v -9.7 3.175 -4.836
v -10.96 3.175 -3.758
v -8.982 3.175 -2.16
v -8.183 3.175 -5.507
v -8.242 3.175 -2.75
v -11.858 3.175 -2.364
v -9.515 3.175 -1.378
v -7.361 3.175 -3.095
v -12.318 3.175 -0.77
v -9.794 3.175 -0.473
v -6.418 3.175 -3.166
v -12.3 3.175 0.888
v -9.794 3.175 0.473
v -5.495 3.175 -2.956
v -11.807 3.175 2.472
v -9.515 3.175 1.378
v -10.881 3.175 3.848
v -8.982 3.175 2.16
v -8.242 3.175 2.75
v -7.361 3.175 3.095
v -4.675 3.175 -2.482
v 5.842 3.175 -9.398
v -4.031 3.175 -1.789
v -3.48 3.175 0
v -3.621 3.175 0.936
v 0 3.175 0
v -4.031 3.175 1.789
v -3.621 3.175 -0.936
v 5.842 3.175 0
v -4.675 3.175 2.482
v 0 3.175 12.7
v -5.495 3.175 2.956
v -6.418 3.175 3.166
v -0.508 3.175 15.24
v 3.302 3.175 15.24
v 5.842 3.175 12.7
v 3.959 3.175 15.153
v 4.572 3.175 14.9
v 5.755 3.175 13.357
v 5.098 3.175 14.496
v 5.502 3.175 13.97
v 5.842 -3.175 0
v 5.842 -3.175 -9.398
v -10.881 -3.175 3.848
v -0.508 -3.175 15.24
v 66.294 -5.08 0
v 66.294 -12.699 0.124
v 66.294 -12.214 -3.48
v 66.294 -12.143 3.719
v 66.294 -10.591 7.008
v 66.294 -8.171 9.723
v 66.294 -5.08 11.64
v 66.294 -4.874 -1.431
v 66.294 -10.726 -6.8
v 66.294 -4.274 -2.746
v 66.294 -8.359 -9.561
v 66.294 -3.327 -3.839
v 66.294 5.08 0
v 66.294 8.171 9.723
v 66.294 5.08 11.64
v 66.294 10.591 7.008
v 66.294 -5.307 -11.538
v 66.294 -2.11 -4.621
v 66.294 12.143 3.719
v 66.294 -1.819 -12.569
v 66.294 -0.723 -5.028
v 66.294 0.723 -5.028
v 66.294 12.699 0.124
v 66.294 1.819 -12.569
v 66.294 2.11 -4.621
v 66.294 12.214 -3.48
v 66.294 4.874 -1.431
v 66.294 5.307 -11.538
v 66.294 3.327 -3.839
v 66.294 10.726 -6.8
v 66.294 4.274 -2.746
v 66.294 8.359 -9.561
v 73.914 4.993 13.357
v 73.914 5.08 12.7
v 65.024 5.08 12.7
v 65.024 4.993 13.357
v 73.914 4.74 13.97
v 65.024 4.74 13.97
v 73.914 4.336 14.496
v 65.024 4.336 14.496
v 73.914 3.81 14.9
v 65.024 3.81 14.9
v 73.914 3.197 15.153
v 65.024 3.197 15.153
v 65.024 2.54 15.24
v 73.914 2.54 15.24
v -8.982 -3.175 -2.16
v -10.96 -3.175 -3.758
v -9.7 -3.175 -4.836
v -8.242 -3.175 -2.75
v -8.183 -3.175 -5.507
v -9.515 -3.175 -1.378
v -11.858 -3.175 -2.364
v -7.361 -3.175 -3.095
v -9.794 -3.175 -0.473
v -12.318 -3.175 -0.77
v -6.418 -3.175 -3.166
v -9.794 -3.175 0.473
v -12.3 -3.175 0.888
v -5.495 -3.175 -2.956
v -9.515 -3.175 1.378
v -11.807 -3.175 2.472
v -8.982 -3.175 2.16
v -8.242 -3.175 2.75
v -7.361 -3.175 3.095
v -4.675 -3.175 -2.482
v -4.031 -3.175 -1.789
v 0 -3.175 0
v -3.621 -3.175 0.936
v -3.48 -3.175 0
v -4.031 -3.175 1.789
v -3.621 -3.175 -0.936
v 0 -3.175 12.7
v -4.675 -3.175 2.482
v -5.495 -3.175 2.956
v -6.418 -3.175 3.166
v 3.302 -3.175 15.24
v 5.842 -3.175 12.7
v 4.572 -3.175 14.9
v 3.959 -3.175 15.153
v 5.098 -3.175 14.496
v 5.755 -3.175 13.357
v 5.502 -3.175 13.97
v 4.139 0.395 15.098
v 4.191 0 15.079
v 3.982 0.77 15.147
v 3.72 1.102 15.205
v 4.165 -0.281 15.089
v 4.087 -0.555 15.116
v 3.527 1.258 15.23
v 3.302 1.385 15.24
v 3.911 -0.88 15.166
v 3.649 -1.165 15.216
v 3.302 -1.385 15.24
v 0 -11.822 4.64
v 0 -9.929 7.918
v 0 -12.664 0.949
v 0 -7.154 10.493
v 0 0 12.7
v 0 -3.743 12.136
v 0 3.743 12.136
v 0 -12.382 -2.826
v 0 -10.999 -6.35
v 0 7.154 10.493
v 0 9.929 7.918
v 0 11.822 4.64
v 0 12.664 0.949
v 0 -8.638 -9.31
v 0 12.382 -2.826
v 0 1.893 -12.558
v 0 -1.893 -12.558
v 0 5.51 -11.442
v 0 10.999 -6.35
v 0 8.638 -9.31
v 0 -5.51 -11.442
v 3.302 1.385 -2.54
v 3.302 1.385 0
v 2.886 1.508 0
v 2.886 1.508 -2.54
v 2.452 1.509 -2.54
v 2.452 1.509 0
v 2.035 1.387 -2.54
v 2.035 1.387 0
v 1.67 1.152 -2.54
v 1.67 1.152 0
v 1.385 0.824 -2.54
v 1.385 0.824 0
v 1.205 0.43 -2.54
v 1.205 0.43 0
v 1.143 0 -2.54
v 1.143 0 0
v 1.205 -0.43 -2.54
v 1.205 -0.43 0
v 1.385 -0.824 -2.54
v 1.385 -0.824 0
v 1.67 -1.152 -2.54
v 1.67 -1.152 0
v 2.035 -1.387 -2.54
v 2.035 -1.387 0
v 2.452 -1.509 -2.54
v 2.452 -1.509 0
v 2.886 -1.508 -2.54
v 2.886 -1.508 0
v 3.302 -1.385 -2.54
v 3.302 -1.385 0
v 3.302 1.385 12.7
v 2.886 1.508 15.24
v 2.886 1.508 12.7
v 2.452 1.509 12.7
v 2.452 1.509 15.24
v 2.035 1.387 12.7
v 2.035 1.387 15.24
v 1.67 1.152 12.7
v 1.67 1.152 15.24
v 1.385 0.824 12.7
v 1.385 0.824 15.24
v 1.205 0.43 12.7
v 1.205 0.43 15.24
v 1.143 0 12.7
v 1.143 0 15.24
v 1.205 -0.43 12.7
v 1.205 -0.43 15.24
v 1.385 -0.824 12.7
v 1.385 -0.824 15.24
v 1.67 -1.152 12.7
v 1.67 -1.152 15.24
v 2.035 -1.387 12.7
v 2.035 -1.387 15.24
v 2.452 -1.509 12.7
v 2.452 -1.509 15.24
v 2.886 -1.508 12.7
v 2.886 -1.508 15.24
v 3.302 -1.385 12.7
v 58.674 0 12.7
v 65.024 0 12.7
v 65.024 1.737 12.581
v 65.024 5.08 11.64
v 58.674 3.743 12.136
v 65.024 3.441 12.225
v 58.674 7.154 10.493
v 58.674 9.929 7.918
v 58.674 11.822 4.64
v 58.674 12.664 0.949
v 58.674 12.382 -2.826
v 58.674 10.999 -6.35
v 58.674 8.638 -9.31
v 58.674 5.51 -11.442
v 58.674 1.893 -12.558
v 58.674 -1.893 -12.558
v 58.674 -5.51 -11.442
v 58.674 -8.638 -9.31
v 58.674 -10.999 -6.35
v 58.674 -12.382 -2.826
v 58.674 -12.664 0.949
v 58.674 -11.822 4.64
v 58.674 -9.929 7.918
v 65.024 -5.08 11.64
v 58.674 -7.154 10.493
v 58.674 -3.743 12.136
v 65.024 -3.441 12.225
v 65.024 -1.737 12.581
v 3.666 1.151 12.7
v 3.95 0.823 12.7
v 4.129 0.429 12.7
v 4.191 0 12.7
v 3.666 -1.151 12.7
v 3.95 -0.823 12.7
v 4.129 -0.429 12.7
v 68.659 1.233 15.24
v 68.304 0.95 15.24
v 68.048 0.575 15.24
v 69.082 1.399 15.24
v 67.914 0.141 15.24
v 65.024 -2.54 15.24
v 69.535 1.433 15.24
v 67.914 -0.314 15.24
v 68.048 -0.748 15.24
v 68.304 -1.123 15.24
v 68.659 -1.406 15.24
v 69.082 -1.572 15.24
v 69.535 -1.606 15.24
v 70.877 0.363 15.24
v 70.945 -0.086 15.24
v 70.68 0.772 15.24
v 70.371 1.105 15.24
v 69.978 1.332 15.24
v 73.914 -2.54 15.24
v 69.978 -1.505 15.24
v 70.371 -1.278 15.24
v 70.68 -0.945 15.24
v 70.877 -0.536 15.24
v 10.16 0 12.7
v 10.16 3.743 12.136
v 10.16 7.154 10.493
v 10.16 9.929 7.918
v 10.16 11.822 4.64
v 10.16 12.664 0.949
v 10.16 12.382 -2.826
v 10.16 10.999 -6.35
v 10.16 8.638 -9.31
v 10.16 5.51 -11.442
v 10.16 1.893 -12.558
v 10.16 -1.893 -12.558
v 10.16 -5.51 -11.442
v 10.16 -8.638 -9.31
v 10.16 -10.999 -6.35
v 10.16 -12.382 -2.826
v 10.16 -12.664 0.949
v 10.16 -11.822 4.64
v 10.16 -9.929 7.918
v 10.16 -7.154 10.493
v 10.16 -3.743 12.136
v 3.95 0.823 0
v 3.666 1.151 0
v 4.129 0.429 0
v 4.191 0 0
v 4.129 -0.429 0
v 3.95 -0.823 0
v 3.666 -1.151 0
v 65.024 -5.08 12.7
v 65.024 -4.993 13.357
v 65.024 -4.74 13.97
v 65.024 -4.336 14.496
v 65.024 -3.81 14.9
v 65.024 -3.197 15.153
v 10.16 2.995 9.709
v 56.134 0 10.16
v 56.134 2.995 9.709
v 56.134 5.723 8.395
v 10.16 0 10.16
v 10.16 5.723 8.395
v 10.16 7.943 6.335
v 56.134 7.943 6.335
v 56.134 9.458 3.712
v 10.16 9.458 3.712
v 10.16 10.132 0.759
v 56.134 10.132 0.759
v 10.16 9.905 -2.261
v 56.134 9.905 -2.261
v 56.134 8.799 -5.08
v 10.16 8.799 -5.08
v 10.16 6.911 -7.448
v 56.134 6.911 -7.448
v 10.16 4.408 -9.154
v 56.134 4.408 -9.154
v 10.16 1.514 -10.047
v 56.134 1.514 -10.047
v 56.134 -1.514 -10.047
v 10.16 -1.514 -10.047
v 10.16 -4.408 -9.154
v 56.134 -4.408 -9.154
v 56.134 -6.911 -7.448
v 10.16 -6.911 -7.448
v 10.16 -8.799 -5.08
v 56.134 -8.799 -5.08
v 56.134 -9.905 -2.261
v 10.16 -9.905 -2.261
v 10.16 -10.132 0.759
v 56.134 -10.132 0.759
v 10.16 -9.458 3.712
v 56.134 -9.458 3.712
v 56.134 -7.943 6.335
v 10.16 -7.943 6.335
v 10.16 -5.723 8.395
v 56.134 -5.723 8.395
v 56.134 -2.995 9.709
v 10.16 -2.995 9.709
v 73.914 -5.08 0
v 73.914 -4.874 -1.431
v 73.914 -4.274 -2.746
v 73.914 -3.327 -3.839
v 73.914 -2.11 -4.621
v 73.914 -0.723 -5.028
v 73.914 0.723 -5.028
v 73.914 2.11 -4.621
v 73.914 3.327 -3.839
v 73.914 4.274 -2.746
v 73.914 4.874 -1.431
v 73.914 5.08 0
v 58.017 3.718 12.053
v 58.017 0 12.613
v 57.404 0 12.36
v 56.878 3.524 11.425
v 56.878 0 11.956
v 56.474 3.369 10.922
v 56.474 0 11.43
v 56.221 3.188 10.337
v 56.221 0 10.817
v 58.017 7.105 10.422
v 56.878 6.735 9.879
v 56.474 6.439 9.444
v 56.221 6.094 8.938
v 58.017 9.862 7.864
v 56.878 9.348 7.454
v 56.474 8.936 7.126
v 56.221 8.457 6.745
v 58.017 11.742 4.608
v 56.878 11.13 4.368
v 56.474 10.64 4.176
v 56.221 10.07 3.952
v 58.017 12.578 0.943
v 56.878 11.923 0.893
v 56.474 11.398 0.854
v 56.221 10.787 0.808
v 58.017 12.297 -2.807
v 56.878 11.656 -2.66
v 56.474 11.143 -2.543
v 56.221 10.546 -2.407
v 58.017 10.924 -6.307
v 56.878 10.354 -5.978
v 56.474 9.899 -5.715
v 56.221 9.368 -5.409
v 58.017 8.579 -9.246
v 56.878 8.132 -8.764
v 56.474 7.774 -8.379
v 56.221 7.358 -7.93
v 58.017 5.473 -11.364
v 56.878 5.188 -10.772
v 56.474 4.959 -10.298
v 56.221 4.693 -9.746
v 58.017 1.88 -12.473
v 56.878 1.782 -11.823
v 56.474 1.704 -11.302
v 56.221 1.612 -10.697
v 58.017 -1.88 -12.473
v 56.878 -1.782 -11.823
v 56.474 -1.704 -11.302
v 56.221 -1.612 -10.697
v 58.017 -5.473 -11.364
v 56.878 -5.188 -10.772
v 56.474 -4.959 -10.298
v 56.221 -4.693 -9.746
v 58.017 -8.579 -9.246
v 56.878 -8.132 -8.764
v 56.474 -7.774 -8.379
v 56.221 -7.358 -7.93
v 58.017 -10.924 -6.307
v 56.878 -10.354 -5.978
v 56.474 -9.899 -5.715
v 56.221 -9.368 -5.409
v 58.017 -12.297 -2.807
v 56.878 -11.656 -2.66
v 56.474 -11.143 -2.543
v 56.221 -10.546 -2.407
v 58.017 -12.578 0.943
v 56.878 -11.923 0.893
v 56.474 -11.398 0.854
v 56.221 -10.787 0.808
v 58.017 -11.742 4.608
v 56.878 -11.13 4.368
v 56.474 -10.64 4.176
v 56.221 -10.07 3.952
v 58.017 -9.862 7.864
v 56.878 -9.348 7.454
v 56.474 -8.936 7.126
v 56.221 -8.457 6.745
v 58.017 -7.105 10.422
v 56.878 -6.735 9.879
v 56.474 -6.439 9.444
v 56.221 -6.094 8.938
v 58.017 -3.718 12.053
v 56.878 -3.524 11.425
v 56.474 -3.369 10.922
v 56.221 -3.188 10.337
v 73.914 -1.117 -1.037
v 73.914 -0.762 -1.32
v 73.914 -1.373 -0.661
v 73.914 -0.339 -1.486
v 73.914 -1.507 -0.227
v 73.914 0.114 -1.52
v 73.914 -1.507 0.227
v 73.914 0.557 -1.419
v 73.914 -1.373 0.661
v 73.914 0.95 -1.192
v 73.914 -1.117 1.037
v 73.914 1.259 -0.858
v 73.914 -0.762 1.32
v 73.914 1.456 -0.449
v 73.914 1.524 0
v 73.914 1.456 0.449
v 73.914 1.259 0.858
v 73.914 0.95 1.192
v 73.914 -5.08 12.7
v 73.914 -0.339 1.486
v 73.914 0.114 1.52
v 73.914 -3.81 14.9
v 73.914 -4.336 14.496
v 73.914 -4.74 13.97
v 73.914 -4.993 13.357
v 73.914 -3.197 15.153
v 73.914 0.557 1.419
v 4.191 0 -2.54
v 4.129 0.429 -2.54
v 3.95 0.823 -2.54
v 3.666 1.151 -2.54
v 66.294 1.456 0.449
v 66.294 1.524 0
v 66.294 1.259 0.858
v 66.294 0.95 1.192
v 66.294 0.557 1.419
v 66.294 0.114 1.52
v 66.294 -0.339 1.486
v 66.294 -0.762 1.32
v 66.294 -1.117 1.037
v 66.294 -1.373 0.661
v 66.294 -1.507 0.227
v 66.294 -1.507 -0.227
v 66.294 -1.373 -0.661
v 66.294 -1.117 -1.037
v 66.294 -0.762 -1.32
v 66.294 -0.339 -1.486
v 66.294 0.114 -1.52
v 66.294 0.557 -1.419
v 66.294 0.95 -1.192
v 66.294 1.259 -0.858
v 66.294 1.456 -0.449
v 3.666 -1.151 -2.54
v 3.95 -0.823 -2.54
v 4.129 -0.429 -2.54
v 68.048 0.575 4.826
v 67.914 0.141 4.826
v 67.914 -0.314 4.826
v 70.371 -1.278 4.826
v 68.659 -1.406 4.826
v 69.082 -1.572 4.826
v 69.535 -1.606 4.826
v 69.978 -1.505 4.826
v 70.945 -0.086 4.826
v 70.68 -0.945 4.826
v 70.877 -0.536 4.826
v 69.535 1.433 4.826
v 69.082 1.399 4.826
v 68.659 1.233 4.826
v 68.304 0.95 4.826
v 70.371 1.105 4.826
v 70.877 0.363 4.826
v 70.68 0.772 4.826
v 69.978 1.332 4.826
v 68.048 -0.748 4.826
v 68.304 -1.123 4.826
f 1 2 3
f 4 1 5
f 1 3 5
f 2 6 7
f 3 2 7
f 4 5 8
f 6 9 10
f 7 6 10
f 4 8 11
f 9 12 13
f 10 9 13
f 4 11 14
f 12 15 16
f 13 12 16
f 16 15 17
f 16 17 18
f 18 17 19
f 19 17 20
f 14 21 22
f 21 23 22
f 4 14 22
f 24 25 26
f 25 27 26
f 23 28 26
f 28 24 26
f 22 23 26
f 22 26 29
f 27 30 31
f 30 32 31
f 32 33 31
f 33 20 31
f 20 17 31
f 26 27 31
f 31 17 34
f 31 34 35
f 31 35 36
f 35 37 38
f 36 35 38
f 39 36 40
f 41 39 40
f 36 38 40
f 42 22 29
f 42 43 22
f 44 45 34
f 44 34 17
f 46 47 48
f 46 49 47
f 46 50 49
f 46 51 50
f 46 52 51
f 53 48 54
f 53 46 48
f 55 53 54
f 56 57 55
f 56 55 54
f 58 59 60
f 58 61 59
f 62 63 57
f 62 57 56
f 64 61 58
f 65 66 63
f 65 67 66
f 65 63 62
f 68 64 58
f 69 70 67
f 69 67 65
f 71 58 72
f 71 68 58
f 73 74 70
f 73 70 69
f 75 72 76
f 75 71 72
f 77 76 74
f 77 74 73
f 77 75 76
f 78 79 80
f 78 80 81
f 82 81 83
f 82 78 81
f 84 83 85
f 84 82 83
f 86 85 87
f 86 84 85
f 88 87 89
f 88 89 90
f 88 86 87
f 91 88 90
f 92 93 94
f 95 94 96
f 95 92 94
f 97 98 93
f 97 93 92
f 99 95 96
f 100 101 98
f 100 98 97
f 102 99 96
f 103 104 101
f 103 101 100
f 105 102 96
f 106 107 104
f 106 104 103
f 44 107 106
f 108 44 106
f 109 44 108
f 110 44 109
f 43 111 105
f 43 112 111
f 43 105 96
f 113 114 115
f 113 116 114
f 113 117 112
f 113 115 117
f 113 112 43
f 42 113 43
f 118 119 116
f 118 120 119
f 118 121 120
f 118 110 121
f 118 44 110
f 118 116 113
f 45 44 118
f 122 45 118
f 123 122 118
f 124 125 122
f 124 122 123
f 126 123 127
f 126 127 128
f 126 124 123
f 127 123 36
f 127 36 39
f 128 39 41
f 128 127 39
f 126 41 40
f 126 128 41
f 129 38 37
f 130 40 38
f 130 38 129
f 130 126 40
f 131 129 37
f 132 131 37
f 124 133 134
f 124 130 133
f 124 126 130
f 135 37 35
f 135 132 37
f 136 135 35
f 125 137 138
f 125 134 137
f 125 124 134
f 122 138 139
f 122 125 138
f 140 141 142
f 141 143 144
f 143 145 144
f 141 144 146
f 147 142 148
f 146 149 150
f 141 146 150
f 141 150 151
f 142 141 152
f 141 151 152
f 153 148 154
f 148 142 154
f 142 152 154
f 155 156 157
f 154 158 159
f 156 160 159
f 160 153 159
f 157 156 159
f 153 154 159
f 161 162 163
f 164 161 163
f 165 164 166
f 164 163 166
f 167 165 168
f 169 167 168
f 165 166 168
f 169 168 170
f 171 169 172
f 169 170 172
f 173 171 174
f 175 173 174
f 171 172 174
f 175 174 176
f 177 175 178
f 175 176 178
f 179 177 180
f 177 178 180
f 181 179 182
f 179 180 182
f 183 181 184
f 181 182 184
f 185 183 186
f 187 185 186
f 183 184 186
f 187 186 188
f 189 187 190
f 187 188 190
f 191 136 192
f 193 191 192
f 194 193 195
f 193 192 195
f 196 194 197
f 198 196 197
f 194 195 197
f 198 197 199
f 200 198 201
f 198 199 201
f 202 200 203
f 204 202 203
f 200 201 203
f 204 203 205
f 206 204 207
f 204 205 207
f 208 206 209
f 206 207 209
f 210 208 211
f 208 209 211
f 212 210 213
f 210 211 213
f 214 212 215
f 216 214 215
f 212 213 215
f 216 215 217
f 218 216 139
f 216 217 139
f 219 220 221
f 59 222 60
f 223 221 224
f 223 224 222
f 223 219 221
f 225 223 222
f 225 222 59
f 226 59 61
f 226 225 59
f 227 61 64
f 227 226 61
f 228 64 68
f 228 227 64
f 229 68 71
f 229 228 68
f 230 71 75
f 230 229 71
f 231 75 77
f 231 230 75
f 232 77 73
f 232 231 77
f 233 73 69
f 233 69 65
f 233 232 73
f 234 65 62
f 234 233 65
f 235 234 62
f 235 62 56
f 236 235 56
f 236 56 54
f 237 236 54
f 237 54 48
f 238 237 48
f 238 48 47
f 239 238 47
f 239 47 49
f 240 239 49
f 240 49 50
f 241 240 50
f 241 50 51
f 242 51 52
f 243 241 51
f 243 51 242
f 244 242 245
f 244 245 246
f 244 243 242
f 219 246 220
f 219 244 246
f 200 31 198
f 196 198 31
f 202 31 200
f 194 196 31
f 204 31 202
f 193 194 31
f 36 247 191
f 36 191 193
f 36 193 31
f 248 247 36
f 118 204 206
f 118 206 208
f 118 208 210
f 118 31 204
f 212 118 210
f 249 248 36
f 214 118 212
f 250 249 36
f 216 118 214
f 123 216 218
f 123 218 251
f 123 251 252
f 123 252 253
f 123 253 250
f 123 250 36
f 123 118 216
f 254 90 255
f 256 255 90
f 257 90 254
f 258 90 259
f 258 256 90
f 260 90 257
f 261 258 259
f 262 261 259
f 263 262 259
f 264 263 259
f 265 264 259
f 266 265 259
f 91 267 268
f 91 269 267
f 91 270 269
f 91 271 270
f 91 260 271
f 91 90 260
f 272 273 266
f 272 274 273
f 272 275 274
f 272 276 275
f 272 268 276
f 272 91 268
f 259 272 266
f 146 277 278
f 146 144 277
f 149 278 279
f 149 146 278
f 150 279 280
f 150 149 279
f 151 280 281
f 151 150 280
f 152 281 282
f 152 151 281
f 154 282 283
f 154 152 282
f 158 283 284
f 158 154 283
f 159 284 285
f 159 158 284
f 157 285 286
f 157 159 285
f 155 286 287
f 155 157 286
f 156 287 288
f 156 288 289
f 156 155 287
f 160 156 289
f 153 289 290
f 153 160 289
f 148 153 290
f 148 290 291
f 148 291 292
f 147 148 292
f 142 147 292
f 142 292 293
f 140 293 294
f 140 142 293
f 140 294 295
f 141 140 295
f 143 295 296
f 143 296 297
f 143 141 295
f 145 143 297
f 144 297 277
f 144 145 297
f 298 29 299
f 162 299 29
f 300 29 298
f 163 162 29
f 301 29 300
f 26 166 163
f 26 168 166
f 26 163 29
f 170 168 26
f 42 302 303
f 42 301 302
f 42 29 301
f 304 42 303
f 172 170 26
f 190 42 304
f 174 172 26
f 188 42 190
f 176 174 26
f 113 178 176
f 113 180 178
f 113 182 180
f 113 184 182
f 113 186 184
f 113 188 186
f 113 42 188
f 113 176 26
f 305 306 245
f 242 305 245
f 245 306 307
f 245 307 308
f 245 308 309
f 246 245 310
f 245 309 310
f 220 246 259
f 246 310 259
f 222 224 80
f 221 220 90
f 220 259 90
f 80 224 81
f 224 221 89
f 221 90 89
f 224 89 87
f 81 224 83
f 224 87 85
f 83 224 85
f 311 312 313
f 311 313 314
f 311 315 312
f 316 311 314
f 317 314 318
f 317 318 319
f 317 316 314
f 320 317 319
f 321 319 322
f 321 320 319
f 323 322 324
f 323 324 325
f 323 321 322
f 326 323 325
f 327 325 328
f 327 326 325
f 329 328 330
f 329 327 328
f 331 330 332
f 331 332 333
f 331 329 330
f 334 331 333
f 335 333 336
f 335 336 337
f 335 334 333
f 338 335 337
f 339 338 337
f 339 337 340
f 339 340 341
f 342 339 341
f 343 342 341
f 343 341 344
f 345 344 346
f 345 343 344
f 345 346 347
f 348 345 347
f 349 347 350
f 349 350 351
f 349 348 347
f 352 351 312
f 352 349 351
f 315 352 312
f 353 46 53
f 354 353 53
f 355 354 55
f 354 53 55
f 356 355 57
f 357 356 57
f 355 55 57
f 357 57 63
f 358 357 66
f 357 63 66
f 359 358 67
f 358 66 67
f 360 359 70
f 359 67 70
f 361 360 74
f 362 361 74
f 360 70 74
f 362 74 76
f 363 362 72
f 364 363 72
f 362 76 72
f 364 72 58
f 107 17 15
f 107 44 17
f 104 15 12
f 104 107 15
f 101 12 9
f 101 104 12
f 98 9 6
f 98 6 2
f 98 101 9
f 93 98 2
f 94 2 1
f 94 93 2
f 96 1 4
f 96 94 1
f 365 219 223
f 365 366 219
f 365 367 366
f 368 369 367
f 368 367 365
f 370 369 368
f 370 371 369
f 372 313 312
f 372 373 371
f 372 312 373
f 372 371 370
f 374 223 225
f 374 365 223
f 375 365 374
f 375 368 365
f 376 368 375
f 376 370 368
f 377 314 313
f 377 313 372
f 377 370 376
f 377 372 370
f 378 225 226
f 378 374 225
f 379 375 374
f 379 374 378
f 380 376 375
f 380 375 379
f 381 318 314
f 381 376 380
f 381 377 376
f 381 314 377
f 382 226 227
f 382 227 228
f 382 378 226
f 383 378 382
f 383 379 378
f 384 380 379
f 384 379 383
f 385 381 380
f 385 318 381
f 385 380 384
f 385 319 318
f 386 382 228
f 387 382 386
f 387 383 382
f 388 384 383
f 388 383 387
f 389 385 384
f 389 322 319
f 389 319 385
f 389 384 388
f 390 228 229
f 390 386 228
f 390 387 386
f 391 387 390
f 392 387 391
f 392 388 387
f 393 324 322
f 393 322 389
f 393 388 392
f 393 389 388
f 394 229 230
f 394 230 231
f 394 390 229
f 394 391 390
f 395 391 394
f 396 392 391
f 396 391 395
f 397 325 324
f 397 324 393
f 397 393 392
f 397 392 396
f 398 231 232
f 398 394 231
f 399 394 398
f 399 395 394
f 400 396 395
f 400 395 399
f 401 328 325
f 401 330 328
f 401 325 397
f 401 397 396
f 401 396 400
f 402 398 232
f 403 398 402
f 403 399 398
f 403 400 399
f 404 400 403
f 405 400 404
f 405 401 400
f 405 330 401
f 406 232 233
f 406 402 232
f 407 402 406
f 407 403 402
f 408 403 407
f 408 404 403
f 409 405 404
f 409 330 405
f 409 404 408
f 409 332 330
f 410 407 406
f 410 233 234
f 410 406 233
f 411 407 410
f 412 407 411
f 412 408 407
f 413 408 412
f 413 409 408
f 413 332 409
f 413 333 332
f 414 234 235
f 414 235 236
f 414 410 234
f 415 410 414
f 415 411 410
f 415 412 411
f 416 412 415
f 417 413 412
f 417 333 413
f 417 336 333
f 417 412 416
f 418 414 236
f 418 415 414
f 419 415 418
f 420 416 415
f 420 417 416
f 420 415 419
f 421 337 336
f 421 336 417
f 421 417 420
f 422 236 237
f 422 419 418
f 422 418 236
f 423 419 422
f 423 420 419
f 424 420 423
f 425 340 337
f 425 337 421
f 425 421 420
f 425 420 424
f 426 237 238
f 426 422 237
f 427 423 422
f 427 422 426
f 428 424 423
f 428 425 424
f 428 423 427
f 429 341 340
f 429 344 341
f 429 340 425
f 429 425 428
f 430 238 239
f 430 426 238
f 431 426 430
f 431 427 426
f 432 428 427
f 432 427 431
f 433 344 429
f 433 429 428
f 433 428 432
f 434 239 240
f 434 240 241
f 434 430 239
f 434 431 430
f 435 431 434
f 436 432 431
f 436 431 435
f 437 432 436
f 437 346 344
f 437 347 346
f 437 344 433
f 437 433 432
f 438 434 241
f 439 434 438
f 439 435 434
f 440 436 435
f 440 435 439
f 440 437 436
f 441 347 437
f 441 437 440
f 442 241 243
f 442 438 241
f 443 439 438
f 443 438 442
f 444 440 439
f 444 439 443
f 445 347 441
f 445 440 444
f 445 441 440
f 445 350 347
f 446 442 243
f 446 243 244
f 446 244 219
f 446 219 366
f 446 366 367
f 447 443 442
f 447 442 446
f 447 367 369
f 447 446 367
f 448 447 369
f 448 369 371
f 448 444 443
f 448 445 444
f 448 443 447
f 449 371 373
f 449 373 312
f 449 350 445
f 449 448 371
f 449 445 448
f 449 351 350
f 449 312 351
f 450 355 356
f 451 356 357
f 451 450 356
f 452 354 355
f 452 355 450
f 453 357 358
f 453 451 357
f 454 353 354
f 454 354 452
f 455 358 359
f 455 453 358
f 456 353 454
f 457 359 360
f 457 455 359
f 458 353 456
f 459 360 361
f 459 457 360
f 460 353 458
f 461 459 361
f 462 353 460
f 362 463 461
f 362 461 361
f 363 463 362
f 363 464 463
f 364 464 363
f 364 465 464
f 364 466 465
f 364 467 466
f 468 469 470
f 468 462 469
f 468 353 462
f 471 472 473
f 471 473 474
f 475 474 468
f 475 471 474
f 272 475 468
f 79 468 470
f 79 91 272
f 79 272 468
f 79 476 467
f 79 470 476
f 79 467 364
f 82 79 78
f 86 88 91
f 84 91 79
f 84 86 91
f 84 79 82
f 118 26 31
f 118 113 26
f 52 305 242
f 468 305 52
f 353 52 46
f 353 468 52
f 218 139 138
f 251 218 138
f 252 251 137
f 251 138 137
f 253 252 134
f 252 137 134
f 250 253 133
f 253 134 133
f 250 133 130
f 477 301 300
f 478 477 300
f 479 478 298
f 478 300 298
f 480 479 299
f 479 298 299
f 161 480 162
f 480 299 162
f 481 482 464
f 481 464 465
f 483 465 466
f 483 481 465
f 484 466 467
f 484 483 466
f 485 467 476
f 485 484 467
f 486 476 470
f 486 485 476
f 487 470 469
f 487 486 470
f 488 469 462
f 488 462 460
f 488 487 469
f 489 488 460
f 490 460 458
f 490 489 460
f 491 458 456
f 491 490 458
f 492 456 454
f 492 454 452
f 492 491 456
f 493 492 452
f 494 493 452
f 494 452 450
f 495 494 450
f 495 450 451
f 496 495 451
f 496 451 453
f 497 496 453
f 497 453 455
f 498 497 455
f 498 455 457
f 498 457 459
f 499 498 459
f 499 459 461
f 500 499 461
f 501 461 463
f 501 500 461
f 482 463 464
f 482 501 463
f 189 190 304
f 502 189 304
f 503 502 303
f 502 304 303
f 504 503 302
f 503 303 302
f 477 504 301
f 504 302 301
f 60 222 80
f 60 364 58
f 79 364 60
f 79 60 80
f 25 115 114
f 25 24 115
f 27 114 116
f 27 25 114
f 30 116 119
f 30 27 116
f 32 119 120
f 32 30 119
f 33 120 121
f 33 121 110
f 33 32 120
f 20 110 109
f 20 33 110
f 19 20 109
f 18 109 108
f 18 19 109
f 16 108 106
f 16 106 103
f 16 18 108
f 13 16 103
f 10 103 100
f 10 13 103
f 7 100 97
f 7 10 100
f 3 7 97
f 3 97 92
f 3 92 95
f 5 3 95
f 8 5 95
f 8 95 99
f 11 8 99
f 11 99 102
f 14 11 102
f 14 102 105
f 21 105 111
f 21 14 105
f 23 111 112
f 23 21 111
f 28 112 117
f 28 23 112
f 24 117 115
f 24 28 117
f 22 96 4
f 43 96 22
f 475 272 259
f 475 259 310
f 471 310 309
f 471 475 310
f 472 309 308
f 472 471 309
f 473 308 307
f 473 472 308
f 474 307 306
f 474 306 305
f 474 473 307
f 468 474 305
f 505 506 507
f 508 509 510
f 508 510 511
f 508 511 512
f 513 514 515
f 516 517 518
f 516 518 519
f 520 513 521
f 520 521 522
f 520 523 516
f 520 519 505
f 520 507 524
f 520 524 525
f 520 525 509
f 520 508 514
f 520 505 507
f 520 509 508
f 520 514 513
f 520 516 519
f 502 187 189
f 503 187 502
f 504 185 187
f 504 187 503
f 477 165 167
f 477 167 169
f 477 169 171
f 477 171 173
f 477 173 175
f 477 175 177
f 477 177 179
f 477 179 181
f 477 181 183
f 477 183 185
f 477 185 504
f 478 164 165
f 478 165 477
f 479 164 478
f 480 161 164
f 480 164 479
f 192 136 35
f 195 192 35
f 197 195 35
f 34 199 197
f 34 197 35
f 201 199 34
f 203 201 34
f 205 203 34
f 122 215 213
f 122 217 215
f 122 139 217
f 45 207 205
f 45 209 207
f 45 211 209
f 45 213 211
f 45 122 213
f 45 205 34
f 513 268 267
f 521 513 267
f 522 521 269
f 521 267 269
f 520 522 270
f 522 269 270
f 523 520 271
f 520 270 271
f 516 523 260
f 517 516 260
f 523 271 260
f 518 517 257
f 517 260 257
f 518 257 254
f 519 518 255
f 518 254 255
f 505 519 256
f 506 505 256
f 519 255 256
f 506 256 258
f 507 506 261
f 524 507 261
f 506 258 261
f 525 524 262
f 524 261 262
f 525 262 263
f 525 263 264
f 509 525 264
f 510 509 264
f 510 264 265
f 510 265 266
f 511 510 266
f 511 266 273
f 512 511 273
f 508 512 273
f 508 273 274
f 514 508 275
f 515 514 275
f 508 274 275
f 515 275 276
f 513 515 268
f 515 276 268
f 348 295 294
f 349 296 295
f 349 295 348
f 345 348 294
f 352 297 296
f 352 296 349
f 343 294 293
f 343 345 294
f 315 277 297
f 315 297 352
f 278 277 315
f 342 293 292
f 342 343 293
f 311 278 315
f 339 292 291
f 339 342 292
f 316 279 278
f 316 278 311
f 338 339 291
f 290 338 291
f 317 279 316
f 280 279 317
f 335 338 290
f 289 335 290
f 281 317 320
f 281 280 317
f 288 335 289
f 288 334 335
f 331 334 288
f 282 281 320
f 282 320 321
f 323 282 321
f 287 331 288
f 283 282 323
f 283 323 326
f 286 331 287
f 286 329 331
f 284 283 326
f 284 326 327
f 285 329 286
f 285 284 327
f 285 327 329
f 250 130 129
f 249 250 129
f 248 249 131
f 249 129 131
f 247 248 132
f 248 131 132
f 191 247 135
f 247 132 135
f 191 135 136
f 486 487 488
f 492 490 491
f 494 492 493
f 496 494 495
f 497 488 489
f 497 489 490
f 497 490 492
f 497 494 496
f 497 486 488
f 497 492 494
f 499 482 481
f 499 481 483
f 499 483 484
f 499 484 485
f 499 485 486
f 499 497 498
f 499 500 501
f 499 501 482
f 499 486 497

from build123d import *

# Parameters (mm, degrees)
F0_W     = 5.842
F0_H     = 12.7
F0_R     = 3.175
F2_DEPTH = 3.175
F3_R     = 1.524
F4_DEPTH = 7.62
F5_DEPTH = 1.27
F7_DEPTH = 17.78
F6_R     = 1.524
F8_DEPTH = 10.414


with BuildPart() as f1:
    # F0 (on Front) → F1 (revolve)
    with BuildSketch(Plane.XZ):
        with Locations((2.921, 6.35)):
            Rectangle(F0_W, F0_H)
        with BuildLine():
            Line((5.842, 12.7), (5.842, 0))
            Line((5.842, 0), (66.294, 0))
            Line((66.294, 0), (66.294, 12.7))
            Line((66.294, 12.7), (58.674, 12.7))
            ThreePointArc((58.674, 12.7), (56.8779487758, 11.9560512242), (56.134, 10.16))
            Line((56.134, 10.16), (10.16, 10.16))
            Line((10.16, 10.16), (10.16, 12.7))
            Line((10.16, 12.7), (5.842, 12.7))
        make_face()
    revolve(axis=Axis((33.147, 0, 0), (-1, 0, 0)))

    # F3 (on face) → F4 (join)
    with BuildSketch(Plane.YZ.offset(66.294)):
        with BuildLine():
            ThreePointArc((-5.08, 11.6397422652), (0, 12.7), (5.08, 11.6397422652))
            Line((5.08, 11.6397422652), (5.08, 12.7))
            ThreePointArc((5.08, 12.7), (4.3360512242, 14.4960512242), (2.54, 15.24))
            Line((2.54, 15.24), (-2.54, 15.24))
            ThreePointArc((-2.54, 15.24), (-4.3360512242, 14.4960512242), (-5.08, 12.7))
            Line((-5.08, 12.7), (-5.08, 11.6397422652))
        make_face()
        with BuildLine():
            ThreePointArc((-5.08, 0), (0, 5.08), (5.08, 0))
            Line((5.08, 0), (5.08, 11.6397422652))
            ThreePointArc((5.08, 11.6397422652), (0, 12.7), (-5.08, 11.6397422652))
            Line((-5.08, 11.6397422652), (-5.08, 0))
        make_face()
        with BuildLine():
            ThreePointArc((-5.08, 0), (0, -5.08), (5.08, 0))
            ThreePointArc((5.08, 0), (0, 5.08), (-5.08, 0))
        make_face()
        Circle(F3_R, mode=Mode.SUBTRACT)
    extrude(amount=F4_DEPTH)

    # F5 (add): a face of the model
    f5_faces = [f1.faces().sort_by_distance(p)[0] for p in [
        (66.294, 0, 13.6861486969),
    ]]
    extrude(f5_faces, amount=F5_DEPTH)

    # F6 (on face) → F8 (cut)
    with BuildSketch(Plane.XY.offset(15.24)):
        with Locations((69.4209039211, -0.0863659661)):
            Circle(F6_R)
    extrude(amount=-F8_DEPTH, mode=Mode.SUBTRACT)


with BuildPart() as f2:
    # F0 (on Front) → F2 (new body, symmetric)
    with BuildSketch(Plane.XZ):
        with BuildLine():
            Line((-0.9398, 0), (0, 0))
            Line((0, 0), (0, 12.7))
            Line((0, 12.7), (5.842, 12.7))
            ThreePointArc((5.842, 12.7), (5.0980512242, 14.4960512242), (3.302, 15.24))
            Line((3.302, 15.24), (-0.508, 15.24))
            Line((-0.508, 15.24), (-10.8806298187, 3.8475430269))
            ThreePointArc((-10.8806298187, 3.8475430269), (-4.5919612295, 5.3297205562), (-0.9398, 0))
        make_face()
        with BuildLine():
            Line((5.842, 0), (0, 0))
            Line((0, 0), (-0.9398, 0))
            ThreePointArc((-0.9398, 0), (-3.1957909266, -4.5493385486), (-8.1826630726, -5.5069827884))
            Line((-8.1826630726, -5.5069827884), (5.842, -9.398))
            Line((5.842, -9.398), (5.842, 0))
        make_face()
        with BuildLine():
            ThreePointArc((-8.1826630726, -5.5069827884), (-3.1957909266, -4.5493385486), (-0.9398, 0))
            ThreePointArc((-0.9398, 0), (-4.5919612295, 5.3297205562), (-10.8806298187, 3.8475430269))
            ThreePointArc((-10.8806298187, 3.8475430269), (-12.1459778134, -1.5837270034), (-8.1826630726, -5.5069827884))
        make_face()
        with Locations((-6.6548, 0)):
            Circle(F0_R, mode=Mode.SUBTRACT)
    extrude(amount=F2_DEPTH, both=True)

    # F6 (on face) → F7 (cut)
    with BuildSketch(Plane.XY.offset(15.24)):
        with BuildLine():
            Line((3.302, -1.3854064386), (3.302, 1.3854064386))
            ThreePointArc((3.302, 1.3854064386), (1.143, 0), (3.302, -1.3854064386))
        make_face()
        with BuildLine():
            ThreePointArc((3.302, -1.3854064386), (3.9496371272, -0.8230540687), (4.191, 0))
            ThreePointArc((4.191, 0), (3.9496371272, 0.8230540687), (3.302, 1.3854064386))
            Line((3.302, 1.3854064386), (3.302, -1.3854064386))
        make_face()
    extrude(amount=-F7_DEPTH, mode=Mode.SUBTRACT)


solid = Compound([f1.part, f2.part])
